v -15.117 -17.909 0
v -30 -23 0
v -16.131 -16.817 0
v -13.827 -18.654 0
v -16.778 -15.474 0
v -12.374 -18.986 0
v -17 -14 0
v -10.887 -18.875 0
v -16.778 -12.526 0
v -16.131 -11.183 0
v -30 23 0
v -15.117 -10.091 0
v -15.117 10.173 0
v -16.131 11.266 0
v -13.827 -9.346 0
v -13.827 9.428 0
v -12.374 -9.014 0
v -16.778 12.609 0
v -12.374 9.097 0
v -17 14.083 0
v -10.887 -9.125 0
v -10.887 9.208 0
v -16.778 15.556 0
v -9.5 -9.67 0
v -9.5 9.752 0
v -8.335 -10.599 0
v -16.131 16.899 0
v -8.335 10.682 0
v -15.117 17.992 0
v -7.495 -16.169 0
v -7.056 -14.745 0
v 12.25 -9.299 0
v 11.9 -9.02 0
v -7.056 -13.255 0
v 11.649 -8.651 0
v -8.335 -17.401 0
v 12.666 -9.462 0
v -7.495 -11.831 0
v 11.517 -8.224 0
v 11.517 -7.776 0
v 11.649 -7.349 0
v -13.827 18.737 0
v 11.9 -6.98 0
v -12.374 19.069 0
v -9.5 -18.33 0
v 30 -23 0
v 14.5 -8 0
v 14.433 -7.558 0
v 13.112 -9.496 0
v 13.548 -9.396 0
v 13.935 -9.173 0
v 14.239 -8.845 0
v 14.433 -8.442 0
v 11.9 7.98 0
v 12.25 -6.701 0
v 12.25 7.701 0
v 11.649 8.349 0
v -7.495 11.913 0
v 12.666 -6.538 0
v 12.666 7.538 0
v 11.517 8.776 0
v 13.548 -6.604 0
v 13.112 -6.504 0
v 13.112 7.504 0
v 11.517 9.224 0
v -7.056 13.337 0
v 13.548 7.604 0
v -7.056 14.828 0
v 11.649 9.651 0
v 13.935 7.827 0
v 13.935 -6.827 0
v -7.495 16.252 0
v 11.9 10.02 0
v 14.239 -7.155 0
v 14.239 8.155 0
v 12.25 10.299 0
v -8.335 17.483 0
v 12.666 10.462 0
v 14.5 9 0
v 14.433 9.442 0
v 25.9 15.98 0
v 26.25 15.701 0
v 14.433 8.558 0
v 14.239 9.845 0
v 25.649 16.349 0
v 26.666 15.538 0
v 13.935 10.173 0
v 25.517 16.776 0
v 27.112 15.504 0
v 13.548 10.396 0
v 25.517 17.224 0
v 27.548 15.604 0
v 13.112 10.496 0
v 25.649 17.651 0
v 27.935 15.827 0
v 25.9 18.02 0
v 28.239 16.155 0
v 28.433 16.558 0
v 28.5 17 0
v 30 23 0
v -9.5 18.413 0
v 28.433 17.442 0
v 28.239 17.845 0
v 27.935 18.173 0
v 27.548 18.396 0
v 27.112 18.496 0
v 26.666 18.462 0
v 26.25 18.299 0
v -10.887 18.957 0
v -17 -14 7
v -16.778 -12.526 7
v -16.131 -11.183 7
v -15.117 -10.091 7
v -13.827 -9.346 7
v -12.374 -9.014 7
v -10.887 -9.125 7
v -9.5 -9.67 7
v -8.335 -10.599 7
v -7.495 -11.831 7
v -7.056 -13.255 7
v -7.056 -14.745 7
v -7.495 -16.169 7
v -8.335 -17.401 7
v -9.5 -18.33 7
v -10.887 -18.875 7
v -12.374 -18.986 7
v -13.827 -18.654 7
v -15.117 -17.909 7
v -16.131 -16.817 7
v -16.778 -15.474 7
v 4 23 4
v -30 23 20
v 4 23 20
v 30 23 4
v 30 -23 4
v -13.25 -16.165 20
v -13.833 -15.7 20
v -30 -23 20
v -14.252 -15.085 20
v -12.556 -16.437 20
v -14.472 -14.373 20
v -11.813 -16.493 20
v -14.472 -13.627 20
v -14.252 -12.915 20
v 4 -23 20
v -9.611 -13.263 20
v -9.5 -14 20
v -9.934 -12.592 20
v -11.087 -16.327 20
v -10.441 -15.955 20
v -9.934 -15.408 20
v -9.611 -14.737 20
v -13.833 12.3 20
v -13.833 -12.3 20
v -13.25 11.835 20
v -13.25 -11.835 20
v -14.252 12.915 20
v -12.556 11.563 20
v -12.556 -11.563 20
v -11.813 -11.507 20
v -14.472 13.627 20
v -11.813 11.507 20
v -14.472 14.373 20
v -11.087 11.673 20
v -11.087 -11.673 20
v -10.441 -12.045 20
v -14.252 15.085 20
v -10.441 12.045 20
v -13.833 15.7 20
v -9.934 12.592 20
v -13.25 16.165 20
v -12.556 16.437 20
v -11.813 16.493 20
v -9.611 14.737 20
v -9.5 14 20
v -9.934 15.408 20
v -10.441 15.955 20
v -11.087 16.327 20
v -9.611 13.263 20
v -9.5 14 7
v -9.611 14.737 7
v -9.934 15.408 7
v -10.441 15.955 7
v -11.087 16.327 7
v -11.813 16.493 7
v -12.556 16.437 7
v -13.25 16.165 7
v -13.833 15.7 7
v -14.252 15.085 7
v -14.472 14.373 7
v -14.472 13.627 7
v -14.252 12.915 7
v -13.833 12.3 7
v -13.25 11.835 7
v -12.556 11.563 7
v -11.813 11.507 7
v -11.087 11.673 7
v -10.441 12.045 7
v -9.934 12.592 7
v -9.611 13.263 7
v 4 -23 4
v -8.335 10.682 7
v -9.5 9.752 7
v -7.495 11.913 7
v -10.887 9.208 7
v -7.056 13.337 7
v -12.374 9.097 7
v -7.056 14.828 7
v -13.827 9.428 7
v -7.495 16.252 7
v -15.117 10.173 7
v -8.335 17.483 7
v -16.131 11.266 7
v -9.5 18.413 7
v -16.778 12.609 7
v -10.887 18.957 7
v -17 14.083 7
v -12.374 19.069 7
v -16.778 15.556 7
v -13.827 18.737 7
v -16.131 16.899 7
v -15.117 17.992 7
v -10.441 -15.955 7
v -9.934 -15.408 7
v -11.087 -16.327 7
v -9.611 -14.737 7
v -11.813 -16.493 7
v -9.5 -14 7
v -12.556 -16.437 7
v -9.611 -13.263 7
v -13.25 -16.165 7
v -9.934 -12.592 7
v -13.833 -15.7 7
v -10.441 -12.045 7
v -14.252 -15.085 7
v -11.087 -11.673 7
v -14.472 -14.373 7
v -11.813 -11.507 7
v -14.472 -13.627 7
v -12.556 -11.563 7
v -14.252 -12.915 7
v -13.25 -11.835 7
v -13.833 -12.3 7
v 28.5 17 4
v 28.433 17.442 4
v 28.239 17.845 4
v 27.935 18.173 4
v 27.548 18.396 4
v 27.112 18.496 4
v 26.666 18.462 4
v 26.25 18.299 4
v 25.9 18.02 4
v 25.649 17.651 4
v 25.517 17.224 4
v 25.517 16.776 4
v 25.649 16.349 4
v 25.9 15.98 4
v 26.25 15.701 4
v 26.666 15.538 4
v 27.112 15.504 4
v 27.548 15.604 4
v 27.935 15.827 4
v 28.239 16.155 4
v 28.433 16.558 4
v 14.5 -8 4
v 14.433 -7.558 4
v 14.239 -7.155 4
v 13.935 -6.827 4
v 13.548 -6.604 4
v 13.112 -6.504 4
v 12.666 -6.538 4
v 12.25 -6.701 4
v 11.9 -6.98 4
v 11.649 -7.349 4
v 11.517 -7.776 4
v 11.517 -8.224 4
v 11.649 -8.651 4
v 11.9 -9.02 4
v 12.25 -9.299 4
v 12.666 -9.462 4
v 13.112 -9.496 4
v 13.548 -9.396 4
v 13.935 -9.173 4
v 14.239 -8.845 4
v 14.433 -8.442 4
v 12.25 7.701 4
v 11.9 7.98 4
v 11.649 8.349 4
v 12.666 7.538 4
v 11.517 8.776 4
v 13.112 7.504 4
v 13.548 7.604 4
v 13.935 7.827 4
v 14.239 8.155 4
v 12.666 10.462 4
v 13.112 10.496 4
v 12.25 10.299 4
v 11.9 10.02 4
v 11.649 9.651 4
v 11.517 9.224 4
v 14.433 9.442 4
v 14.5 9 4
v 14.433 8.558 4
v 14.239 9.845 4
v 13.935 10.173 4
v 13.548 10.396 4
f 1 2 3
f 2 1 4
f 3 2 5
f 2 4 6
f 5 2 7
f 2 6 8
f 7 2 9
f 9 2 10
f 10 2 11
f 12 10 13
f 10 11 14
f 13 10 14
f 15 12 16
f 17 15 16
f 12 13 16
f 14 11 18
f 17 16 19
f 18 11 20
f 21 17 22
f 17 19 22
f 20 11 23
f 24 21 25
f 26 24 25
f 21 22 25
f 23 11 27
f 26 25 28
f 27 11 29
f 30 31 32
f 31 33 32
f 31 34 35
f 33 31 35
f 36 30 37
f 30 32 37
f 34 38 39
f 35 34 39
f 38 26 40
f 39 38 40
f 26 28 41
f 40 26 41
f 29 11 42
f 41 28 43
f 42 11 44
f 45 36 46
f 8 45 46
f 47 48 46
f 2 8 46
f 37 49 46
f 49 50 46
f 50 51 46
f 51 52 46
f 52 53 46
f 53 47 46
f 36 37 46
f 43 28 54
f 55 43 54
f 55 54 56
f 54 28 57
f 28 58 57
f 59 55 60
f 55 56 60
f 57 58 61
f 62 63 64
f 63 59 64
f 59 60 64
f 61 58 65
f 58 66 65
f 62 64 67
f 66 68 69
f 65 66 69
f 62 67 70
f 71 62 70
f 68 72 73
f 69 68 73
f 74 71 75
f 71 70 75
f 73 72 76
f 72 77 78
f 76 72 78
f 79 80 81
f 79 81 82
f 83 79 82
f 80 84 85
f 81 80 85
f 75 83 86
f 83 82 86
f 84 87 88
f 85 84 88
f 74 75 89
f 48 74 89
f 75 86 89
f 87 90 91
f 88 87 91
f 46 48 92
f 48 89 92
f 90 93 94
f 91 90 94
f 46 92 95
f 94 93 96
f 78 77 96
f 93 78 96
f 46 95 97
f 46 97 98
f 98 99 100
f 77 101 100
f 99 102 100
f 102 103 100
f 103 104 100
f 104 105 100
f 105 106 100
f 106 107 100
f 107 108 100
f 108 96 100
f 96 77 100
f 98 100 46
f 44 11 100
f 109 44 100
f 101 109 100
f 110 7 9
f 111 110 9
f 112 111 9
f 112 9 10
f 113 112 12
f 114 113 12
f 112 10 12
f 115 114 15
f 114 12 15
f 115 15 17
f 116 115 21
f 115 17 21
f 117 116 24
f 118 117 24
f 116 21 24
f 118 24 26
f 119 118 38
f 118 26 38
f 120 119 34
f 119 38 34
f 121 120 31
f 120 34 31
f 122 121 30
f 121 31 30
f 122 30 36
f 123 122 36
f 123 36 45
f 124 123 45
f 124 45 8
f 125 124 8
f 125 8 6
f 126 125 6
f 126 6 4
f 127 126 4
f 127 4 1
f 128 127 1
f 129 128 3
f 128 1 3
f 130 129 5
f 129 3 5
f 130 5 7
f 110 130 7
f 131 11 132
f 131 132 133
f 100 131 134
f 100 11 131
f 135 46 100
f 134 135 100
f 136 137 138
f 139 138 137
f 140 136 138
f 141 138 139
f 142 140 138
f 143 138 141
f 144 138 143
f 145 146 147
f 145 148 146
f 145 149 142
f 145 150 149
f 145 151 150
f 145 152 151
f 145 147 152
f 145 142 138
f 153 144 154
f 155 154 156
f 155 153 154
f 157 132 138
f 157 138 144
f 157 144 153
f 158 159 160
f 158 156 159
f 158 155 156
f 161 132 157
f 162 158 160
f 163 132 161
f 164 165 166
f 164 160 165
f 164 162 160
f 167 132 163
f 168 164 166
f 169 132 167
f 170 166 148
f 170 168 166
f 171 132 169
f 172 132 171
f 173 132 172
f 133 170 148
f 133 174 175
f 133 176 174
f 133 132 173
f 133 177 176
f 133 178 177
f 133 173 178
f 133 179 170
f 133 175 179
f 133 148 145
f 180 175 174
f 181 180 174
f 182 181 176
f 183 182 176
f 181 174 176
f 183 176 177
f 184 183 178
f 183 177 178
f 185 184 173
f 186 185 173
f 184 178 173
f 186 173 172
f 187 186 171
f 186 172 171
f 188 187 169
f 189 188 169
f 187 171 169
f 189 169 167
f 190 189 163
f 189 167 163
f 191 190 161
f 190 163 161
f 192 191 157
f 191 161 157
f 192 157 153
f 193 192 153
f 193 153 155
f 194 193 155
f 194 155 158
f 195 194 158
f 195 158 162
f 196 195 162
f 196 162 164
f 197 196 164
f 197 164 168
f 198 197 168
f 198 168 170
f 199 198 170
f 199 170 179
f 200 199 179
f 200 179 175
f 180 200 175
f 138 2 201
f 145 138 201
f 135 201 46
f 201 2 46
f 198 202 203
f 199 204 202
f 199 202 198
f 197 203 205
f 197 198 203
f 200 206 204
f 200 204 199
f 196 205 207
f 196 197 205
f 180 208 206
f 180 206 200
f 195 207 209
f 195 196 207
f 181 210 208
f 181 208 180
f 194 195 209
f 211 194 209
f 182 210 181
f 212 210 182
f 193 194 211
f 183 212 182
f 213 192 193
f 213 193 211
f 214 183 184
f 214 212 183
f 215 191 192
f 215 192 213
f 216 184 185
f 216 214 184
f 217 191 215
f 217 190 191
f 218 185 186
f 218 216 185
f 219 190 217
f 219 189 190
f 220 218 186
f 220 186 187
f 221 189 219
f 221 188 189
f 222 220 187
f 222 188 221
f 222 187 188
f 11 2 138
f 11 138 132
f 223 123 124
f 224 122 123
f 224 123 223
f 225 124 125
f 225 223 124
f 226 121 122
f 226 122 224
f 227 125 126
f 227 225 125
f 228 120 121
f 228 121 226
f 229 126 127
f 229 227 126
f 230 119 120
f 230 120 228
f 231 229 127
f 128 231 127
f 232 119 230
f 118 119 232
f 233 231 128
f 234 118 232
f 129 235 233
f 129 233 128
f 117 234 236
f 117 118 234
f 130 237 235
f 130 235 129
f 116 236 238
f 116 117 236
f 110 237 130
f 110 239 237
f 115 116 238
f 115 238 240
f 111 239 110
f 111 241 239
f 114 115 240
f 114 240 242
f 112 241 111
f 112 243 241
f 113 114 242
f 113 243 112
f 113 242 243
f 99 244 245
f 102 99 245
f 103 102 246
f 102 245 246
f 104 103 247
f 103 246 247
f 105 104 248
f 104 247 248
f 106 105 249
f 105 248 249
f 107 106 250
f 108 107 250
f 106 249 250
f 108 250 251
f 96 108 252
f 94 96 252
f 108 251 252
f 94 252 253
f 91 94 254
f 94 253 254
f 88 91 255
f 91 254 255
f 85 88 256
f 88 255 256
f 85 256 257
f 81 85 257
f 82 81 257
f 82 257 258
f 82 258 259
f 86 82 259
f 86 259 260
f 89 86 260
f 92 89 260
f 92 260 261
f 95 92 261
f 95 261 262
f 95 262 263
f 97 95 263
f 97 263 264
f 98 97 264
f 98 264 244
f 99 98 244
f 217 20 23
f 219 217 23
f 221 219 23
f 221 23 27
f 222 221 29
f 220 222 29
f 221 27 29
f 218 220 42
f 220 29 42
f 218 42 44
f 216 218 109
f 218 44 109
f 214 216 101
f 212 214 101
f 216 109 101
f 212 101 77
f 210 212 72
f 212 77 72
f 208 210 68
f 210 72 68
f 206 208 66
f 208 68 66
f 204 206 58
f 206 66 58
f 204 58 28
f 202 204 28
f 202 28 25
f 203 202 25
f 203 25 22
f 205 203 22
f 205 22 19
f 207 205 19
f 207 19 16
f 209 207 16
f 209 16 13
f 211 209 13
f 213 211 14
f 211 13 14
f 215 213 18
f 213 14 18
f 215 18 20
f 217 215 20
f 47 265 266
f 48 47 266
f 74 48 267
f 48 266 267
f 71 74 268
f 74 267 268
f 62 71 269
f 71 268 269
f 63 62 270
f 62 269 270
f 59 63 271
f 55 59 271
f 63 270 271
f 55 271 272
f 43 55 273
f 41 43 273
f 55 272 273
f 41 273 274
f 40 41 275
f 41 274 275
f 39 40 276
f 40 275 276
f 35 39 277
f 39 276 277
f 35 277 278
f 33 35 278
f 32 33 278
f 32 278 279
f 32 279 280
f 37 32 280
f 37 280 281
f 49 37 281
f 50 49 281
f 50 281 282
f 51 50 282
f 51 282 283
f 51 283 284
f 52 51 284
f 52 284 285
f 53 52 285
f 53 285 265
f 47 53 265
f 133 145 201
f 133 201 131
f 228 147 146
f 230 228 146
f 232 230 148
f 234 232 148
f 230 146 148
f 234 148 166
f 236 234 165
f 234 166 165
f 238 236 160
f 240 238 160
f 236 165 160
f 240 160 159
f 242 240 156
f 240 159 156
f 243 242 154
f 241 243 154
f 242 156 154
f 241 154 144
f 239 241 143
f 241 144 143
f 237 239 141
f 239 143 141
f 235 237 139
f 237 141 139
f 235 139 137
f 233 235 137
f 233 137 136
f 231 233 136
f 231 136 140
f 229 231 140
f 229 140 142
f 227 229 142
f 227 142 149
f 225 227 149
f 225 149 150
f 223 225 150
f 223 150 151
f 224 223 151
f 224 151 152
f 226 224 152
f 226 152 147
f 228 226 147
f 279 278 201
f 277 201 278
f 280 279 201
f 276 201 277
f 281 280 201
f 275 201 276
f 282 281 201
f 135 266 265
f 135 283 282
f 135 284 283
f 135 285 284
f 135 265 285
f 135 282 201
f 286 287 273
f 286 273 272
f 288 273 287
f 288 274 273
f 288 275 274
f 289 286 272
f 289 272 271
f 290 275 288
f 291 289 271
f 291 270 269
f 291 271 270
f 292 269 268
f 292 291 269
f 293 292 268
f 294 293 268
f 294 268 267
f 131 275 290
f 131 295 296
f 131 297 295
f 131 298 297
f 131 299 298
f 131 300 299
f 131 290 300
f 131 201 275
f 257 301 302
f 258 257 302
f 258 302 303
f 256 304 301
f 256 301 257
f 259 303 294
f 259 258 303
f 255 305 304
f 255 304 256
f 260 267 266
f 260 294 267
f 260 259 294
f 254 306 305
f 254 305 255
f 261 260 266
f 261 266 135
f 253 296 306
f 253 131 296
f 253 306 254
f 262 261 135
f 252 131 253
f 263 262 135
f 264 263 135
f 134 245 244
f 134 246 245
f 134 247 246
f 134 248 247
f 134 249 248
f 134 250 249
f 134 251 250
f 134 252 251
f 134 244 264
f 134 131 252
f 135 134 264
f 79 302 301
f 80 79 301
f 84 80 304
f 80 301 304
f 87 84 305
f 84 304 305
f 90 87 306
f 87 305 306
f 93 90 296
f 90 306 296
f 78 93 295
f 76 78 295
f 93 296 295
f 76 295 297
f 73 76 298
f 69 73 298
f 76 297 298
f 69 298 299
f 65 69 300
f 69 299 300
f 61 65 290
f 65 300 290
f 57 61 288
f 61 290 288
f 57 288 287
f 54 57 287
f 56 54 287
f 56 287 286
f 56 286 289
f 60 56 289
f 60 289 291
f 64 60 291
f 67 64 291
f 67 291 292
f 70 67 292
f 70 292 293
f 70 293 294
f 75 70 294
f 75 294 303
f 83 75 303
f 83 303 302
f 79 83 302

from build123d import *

# Parameters (mm, degrees)
ESBO_O1_W                = 60
ESBO_O1_H                = 46
RESSALTO_EXTRUS_O1_DEPTH = 20
ESBO_O2_W                = 26
ESBO_O2_H                = 46
CORTE_EXTRUS_O1_DEPTH    = 16
ESBO_O5_R                = 1.5
CORTE_EXTRUS_O3_DEPTH    = 5
ESBO_O8_R                = 2.5
CORTE_EXTRUS_O5_DEPTH    = 21
ESBO_O9_R                = 5
CORTE_EXTRUS_O6_DEPTH    = 7


with BuildPart() as part:
    # Esboço1 → Ressalto-extrusão1 (new body)
    with BuildSketch(Plane.XY):
        Rectangle(ESBO_O1_W, ESBO_O1_H)
    extrude(amount=RESSALTO_EXTRUS_O1_DEPTH)

    # Esboço2 → Corte-extrusão1 (cut)
    with BuildSketch(Plane.XY.offset(20)):
        with Locations((17, 0)):
            Rectangle(ESBO_O2_W, ESBO_O2_H)
    extrude(amount=-CORTE_EXTRUS_O1_DEPTH, mode=Mode.SUBTRACT)

    # Esboço5 → Corte-extrusão3 (cut, through all)
    with BuildSketch(Plane.XY.offset(4)):
        with Locations((13, 9)):
            Circle(ESBO_O5_R)
        with Locations((13, -8)):
            Circle(ESBO_O5_R)
        with Locations((27, 17)):
            Circle(ESBO_O5_R)
    extrude(amount=-CORTE_EXTRUS_O3_DEPTH, mode=Mode.SUBTRACT)

    # Esboço8 → Corte-extrusão5 (cut, through all)
    with BuildSketch(Plane.XY.offset(20)):
        with Locations((-12, -14)):
            Circle(ESBO_O8_R)
        with Locations((-12, 14)):
            Circle(ESBO_O8_R)
    extrude(amount=-CORTE_EXTRUS_O5_DEPTH, mode=Mode.SUBTRACT)

    # Esboço9 → Corte-extrusão6 (cut)
    with BuildSketch(Plane(origin=(0, 0, 0), x_dir=(-1, 0, 0), z_dir=(0, 0, -1))):
        with Locations((12, -14)):
            Circle(ESBO_O9_R)
        with Locations((12, 14.082568483)):
            Circle(ESBO_O9_R)
    extrude(amount=-CORTE_EXTRUS_O6_DEPTH, mode=Mode.SUBTRACT)


solid = part.part
